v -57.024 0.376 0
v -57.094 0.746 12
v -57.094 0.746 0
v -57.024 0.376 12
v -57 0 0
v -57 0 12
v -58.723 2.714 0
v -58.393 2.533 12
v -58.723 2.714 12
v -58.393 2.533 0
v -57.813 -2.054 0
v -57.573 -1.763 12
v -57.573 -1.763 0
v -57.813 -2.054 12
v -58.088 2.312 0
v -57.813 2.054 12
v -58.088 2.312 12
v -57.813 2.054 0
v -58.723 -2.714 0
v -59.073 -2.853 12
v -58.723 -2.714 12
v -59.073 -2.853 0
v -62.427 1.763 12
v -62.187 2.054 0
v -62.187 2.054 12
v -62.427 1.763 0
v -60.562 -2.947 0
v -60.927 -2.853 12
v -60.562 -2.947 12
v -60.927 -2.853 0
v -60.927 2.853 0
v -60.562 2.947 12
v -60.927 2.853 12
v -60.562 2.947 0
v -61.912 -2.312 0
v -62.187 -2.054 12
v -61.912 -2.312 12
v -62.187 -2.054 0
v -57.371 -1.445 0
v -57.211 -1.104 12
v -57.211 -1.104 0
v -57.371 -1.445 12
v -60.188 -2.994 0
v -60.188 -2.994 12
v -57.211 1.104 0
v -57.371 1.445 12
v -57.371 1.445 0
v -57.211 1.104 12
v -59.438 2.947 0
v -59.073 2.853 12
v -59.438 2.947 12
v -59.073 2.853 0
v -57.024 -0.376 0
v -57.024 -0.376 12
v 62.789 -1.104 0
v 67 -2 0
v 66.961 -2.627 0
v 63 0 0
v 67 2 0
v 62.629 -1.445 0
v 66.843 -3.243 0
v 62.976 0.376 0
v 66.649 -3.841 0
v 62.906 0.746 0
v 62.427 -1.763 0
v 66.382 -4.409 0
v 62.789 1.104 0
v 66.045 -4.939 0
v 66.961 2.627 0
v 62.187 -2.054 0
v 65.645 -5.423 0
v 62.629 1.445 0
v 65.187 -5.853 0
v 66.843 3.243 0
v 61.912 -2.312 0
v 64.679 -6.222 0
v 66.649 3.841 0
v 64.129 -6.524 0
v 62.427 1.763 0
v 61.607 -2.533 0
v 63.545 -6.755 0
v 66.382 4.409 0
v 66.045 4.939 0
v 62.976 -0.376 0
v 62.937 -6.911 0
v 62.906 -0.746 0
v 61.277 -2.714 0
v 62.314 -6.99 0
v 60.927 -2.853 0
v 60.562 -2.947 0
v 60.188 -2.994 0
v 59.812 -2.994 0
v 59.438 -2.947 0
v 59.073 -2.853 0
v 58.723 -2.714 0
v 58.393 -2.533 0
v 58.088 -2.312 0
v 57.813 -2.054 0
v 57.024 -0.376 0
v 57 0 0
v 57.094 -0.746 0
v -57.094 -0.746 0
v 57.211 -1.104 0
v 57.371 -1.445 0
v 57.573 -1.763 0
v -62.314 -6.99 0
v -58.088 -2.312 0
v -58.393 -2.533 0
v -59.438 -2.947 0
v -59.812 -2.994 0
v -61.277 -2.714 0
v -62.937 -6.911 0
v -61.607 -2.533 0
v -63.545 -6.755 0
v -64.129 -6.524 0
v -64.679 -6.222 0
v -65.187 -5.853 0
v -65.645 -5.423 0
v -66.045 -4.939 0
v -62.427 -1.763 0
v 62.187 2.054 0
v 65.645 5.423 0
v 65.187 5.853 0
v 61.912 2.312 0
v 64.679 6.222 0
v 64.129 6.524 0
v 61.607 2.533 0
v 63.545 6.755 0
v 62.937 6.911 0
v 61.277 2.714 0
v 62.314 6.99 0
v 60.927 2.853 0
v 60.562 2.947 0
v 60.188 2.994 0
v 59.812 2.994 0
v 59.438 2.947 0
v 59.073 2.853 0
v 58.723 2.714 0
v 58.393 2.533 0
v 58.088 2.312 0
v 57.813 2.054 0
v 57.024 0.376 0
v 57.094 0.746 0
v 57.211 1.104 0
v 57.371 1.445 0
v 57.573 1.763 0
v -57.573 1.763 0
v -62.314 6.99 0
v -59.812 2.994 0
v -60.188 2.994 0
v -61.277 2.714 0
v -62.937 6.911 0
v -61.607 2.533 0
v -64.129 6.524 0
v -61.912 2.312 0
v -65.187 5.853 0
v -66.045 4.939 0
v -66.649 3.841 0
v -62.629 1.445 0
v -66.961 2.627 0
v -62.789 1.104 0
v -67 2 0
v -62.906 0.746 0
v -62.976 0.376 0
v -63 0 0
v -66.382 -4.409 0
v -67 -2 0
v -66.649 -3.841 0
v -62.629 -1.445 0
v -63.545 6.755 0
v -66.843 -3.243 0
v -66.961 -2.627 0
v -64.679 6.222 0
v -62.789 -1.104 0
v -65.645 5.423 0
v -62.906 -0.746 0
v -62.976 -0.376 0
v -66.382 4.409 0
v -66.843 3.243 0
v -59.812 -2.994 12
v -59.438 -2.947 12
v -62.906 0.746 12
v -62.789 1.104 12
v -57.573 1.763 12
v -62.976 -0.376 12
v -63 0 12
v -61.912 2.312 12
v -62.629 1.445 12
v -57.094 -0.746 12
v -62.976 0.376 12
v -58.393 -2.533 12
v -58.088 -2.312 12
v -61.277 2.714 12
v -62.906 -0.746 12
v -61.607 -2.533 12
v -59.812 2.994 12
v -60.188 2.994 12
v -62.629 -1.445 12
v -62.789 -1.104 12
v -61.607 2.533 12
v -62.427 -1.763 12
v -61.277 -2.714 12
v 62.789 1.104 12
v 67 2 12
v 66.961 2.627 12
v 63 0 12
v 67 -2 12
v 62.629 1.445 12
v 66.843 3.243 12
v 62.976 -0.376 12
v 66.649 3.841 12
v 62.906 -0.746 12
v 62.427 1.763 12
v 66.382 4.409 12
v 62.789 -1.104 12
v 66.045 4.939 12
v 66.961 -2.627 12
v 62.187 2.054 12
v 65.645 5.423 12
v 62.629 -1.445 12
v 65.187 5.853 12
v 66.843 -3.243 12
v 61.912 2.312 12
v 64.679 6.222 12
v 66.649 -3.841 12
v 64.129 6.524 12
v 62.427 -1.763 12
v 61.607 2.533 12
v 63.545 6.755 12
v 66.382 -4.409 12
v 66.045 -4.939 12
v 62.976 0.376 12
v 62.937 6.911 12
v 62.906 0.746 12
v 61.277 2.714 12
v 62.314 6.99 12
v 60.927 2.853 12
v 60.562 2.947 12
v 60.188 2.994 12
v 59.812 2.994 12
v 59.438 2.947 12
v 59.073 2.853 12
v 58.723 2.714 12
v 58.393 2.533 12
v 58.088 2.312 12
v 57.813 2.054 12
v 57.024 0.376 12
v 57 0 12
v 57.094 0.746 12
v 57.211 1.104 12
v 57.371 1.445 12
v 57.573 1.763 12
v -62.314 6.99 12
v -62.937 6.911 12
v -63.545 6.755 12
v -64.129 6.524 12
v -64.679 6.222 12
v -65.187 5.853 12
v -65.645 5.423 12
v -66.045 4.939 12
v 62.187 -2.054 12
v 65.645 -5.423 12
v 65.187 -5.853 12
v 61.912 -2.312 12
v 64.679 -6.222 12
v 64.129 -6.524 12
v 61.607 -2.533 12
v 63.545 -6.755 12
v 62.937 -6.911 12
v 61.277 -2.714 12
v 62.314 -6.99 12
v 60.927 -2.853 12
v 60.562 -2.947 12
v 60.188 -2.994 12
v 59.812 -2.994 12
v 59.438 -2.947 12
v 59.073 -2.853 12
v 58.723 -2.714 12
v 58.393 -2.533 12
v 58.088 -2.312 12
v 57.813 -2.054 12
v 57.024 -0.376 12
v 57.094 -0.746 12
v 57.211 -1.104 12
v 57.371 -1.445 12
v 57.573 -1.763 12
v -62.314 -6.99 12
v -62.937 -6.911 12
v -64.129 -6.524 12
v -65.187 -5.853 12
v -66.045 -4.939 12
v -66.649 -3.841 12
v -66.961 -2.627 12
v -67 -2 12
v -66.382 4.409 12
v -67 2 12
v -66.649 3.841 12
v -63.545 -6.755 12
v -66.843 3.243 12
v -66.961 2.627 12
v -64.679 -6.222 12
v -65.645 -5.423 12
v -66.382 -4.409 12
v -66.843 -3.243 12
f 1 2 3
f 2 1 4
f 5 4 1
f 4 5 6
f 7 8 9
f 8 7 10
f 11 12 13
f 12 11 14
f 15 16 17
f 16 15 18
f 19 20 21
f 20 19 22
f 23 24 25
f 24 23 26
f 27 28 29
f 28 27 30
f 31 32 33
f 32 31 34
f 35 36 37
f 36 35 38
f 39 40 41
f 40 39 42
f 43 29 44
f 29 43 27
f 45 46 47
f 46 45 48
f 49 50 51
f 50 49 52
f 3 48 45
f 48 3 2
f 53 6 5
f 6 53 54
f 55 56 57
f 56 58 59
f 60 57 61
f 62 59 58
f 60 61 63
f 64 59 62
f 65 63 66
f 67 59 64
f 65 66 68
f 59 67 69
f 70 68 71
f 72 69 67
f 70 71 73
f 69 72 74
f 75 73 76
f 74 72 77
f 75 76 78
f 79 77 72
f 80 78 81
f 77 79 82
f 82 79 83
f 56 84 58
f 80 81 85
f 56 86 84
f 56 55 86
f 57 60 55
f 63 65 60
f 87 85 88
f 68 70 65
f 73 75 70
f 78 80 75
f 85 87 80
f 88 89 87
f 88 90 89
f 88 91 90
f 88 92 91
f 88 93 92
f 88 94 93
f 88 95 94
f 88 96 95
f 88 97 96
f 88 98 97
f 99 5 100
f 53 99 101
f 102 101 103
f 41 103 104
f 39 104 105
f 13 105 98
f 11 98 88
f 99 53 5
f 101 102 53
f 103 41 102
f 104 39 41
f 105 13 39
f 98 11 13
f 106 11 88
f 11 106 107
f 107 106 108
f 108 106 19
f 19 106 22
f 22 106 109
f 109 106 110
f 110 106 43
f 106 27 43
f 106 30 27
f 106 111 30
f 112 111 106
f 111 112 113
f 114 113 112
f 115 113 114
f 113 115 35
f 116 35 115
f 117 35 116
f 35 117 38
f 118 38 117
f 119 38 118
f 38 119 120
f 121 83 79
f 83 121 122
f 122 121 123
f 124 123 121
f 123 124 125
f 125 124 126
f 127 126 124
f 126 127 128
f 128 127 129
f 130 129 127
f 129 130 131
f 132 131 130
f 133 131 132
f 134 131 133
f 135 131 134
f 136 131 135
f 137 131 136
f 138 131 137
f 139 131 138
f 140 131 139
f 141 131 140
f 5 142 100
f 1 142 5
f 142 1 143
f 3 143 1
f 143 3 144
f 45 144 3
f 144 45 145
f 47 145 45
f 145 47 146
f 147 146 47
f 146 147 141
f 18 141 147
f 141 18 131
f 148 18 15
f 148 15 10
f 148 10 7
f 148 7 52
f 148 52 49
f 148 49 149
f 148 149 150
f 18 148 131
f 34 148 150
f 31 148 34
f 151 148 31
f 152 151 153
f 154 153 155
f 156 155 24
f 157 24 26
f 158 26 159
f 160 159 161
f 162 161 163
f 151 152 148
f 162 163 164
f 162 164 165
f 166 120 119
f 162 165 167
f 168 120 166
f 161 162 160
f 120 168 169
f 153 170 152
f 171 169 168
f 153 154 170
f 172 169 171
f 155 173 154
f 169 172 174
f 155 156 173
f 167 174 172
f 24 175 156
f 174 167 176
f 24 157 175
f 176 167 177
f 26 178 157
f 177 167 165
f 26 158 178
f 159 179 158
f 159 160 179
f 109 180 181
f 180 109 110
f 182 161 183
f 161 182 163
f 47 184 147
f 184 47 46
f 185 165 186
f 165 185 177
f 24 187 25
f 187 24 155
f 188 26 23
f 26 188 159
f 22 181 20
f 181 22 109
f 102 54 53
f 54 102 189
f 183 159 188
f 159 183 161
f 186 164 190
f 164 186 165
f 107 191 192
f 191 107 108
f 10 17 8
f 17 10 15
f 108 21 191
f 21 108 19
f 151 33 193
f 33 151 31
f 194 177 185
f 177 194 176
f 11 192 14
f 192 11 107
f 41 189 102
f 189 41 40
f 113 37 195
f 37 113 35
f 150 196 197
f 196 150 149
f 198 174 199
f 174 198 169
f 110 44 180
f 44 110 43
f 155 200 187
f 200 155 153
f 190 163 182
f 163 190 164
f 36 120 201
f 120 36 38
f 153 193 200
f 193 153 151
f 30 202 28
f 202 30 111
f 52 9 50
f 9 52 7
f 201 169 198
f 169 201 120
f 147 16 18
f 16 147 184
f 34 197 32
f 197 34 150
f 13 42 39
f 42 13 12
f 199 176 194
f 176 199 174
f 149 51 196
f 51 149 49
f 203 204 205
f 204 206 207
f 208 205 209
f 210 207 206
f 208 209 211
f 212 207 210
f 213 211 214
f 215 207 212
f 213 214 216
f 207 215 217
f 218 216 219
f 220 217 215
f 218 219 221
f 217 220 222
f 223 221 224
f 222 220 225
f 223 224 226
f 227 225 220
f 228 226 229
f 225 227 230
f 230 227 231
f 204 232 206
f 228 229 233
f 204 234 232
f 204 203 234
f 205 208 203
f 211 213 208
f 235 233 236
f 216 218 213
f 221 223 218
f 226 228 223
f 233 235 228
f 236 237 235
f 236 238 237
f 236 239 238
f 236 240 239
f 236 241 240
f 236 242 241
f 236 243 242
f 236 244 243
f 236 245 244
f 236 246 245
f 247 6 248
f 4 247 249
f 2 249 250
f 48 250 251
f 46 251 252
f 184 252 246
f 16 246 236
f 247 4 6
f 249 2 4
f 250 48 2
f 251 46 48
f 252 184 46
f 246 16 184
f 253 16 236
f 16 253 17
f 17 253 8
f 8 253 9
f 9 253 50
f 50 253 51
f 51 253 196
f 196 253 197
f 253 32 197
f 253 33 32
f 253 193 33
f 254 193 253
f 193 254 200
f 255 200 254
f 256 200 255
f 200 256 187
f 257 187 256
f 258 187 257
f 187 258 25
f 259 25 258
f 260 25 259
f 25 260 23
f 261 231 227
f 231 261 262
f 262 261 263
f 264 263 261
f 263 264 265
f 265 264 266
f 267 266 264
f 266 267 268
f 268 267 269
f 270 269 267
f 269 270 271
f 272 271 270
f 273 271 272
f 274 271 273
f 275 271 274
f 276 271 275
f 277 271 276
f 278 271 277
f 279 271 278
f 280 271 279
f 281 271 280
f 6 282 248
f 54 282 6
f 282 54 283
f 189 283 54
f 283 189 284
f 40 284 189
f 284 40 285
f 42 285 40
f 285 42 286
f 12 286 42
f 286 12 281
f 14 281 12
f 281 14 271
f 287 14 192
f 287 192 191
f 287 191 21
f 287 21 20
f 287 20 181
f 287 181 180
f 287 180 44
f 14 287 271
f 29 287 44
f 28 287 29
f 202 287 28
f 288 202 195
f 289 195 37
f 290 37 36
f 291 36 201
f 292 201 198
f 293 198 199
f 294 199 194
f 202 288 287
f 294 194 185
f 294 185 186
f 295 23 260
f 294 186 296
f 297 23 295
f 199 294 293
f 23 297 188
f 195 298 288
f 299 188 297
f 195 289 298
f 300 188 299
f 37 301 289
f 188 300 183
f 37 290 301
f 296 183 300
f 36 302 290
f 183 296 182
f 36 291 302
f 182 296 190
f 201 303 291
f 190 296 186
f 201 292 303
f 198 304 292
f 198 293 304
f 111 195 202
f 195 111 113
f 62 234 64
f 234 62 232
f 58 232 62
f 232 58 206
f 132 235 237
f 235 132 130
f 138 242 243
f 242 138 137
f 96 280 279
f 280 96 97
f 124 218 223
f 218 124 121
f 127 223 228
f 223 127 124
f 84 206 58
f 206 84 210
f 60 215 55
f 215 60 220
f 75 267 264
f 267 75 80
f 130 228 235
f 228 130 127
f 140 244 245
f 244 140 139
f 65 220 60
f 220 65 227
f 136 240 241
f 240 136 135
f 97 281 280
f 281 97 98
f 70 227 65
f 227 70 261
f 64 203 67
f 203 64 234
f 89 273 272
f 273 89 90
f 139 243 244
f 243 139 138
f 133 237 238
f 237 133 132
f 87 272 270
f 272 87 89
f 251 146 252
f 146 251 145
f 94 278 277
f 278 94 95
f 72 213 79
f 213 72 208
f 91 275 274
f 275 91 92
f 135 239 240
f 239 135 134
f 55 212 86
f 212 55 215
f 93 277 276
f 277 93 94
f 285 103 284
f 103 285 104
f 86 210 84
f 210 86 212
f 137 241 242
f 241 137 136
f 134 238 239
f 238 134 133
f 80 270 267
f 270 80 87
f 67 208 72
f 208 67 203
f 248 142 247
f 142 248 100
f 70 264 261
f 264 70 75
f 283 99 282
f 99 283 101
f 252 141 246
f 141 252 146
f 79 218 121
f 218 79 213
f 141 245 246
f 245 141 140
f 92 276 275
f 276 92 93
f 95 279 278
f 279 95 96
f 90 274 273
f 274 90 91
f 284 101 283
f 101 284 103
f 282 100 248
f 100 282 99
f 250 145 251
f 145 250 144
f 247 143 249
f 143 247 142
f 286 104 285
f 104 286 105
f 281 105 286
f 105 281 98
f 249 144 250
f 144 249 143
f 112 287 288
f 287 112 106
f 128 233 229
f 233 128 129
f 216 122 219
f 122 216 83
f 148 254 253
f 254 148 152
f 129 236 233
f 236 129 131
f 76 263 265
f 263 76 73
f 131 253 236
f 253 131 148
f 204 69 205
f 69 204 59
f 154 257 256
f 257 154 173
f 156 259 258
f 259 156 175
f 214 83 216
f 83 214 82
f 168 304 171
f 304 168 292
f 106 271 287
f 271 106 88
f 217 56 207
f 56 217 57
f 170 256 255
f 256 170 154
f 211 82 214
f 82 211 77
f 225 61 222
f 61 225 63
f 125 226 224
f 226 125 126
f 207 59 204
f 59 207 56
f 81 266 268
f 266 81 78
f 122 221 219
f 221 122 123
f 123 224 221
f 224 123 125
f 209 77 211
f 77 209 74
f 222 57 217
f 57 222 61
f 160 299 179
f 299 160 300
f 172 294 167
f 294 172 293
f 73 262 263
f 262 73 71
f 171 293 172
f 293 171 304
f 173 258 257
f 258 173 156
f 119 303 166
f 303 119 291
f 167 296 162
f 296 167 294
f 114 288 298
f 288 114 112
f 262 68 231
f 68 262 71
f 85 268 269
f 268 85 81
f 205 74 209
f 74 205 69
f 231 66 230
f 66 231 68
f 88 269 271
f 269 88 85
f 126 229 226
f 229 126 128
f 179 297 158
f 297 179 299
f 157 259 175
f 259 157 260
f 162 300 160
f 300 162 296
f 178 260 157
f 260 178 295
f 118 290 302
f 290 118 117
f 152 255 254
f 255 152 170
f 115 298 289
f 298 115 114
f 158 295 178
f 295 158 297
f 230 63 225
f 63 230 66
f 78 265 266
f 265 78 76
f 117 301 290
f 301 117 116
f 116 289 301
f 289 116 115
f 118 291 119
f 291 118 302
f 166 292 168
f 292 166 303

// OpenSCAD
$fn = 50;


difference() {
	union() {
		hull() {
			translate(v = [-62.0000000000, 2.0000000000, 0]) {
				cylinder(h = 12, r = 5);
			}
			translate(v = [62.0000000000, 2.0000000000, 0]) {
				cylinder(h = 12, r = 5);
			}
			translate(v = [-62.0000000000, -2.0000000000, 0]) {
				cylinder(h = 12, r = 5);
			}
			translate(v = [62.0000000000, -2.0000000000, 0]) {
				cylinder(h = 12, r = 5);
			}
		}
	}
	union() {
		translate(v = [-60.0000000000, 0.0000000000, 0]) {
			cylinder(h = 12, r = 3.0000000000);
		}
		translate(v = [60.0000000000, 0.0000000000, 0]) {
			cylinder(h = 12, r = 3.0000000000);
		}
		translate(v = [-60.0000000000, 0.0000000000, 0]) {
			cylinder(h = 12, r = 1.5000000000);
		}
		translate(v = [60.0000000000, 0.0000000000, 0]) {
			cylinder(h = 12, r = 1.5000000000);
		}
		translate(v = [-60.0000000000, 0.0000000000, 0]) {
			cylinder(h = 12, r = 1.5000000000);
		}
		translate(v = [60.0000000000, 0.0000000000, 0]) {
			cylinder(h = 12, r = 1.5000000000);
		}
		translate(v = [-60.0000000000, 0.0000000000, 0]) {
			cylinder(h = 12, r = 1.5000000000);
		}
		translate(v = [60.0000000000, 0.0000000000, 0]) {
			cylinder(h = 12, r = 1.5000000000);
		}
	}
}
